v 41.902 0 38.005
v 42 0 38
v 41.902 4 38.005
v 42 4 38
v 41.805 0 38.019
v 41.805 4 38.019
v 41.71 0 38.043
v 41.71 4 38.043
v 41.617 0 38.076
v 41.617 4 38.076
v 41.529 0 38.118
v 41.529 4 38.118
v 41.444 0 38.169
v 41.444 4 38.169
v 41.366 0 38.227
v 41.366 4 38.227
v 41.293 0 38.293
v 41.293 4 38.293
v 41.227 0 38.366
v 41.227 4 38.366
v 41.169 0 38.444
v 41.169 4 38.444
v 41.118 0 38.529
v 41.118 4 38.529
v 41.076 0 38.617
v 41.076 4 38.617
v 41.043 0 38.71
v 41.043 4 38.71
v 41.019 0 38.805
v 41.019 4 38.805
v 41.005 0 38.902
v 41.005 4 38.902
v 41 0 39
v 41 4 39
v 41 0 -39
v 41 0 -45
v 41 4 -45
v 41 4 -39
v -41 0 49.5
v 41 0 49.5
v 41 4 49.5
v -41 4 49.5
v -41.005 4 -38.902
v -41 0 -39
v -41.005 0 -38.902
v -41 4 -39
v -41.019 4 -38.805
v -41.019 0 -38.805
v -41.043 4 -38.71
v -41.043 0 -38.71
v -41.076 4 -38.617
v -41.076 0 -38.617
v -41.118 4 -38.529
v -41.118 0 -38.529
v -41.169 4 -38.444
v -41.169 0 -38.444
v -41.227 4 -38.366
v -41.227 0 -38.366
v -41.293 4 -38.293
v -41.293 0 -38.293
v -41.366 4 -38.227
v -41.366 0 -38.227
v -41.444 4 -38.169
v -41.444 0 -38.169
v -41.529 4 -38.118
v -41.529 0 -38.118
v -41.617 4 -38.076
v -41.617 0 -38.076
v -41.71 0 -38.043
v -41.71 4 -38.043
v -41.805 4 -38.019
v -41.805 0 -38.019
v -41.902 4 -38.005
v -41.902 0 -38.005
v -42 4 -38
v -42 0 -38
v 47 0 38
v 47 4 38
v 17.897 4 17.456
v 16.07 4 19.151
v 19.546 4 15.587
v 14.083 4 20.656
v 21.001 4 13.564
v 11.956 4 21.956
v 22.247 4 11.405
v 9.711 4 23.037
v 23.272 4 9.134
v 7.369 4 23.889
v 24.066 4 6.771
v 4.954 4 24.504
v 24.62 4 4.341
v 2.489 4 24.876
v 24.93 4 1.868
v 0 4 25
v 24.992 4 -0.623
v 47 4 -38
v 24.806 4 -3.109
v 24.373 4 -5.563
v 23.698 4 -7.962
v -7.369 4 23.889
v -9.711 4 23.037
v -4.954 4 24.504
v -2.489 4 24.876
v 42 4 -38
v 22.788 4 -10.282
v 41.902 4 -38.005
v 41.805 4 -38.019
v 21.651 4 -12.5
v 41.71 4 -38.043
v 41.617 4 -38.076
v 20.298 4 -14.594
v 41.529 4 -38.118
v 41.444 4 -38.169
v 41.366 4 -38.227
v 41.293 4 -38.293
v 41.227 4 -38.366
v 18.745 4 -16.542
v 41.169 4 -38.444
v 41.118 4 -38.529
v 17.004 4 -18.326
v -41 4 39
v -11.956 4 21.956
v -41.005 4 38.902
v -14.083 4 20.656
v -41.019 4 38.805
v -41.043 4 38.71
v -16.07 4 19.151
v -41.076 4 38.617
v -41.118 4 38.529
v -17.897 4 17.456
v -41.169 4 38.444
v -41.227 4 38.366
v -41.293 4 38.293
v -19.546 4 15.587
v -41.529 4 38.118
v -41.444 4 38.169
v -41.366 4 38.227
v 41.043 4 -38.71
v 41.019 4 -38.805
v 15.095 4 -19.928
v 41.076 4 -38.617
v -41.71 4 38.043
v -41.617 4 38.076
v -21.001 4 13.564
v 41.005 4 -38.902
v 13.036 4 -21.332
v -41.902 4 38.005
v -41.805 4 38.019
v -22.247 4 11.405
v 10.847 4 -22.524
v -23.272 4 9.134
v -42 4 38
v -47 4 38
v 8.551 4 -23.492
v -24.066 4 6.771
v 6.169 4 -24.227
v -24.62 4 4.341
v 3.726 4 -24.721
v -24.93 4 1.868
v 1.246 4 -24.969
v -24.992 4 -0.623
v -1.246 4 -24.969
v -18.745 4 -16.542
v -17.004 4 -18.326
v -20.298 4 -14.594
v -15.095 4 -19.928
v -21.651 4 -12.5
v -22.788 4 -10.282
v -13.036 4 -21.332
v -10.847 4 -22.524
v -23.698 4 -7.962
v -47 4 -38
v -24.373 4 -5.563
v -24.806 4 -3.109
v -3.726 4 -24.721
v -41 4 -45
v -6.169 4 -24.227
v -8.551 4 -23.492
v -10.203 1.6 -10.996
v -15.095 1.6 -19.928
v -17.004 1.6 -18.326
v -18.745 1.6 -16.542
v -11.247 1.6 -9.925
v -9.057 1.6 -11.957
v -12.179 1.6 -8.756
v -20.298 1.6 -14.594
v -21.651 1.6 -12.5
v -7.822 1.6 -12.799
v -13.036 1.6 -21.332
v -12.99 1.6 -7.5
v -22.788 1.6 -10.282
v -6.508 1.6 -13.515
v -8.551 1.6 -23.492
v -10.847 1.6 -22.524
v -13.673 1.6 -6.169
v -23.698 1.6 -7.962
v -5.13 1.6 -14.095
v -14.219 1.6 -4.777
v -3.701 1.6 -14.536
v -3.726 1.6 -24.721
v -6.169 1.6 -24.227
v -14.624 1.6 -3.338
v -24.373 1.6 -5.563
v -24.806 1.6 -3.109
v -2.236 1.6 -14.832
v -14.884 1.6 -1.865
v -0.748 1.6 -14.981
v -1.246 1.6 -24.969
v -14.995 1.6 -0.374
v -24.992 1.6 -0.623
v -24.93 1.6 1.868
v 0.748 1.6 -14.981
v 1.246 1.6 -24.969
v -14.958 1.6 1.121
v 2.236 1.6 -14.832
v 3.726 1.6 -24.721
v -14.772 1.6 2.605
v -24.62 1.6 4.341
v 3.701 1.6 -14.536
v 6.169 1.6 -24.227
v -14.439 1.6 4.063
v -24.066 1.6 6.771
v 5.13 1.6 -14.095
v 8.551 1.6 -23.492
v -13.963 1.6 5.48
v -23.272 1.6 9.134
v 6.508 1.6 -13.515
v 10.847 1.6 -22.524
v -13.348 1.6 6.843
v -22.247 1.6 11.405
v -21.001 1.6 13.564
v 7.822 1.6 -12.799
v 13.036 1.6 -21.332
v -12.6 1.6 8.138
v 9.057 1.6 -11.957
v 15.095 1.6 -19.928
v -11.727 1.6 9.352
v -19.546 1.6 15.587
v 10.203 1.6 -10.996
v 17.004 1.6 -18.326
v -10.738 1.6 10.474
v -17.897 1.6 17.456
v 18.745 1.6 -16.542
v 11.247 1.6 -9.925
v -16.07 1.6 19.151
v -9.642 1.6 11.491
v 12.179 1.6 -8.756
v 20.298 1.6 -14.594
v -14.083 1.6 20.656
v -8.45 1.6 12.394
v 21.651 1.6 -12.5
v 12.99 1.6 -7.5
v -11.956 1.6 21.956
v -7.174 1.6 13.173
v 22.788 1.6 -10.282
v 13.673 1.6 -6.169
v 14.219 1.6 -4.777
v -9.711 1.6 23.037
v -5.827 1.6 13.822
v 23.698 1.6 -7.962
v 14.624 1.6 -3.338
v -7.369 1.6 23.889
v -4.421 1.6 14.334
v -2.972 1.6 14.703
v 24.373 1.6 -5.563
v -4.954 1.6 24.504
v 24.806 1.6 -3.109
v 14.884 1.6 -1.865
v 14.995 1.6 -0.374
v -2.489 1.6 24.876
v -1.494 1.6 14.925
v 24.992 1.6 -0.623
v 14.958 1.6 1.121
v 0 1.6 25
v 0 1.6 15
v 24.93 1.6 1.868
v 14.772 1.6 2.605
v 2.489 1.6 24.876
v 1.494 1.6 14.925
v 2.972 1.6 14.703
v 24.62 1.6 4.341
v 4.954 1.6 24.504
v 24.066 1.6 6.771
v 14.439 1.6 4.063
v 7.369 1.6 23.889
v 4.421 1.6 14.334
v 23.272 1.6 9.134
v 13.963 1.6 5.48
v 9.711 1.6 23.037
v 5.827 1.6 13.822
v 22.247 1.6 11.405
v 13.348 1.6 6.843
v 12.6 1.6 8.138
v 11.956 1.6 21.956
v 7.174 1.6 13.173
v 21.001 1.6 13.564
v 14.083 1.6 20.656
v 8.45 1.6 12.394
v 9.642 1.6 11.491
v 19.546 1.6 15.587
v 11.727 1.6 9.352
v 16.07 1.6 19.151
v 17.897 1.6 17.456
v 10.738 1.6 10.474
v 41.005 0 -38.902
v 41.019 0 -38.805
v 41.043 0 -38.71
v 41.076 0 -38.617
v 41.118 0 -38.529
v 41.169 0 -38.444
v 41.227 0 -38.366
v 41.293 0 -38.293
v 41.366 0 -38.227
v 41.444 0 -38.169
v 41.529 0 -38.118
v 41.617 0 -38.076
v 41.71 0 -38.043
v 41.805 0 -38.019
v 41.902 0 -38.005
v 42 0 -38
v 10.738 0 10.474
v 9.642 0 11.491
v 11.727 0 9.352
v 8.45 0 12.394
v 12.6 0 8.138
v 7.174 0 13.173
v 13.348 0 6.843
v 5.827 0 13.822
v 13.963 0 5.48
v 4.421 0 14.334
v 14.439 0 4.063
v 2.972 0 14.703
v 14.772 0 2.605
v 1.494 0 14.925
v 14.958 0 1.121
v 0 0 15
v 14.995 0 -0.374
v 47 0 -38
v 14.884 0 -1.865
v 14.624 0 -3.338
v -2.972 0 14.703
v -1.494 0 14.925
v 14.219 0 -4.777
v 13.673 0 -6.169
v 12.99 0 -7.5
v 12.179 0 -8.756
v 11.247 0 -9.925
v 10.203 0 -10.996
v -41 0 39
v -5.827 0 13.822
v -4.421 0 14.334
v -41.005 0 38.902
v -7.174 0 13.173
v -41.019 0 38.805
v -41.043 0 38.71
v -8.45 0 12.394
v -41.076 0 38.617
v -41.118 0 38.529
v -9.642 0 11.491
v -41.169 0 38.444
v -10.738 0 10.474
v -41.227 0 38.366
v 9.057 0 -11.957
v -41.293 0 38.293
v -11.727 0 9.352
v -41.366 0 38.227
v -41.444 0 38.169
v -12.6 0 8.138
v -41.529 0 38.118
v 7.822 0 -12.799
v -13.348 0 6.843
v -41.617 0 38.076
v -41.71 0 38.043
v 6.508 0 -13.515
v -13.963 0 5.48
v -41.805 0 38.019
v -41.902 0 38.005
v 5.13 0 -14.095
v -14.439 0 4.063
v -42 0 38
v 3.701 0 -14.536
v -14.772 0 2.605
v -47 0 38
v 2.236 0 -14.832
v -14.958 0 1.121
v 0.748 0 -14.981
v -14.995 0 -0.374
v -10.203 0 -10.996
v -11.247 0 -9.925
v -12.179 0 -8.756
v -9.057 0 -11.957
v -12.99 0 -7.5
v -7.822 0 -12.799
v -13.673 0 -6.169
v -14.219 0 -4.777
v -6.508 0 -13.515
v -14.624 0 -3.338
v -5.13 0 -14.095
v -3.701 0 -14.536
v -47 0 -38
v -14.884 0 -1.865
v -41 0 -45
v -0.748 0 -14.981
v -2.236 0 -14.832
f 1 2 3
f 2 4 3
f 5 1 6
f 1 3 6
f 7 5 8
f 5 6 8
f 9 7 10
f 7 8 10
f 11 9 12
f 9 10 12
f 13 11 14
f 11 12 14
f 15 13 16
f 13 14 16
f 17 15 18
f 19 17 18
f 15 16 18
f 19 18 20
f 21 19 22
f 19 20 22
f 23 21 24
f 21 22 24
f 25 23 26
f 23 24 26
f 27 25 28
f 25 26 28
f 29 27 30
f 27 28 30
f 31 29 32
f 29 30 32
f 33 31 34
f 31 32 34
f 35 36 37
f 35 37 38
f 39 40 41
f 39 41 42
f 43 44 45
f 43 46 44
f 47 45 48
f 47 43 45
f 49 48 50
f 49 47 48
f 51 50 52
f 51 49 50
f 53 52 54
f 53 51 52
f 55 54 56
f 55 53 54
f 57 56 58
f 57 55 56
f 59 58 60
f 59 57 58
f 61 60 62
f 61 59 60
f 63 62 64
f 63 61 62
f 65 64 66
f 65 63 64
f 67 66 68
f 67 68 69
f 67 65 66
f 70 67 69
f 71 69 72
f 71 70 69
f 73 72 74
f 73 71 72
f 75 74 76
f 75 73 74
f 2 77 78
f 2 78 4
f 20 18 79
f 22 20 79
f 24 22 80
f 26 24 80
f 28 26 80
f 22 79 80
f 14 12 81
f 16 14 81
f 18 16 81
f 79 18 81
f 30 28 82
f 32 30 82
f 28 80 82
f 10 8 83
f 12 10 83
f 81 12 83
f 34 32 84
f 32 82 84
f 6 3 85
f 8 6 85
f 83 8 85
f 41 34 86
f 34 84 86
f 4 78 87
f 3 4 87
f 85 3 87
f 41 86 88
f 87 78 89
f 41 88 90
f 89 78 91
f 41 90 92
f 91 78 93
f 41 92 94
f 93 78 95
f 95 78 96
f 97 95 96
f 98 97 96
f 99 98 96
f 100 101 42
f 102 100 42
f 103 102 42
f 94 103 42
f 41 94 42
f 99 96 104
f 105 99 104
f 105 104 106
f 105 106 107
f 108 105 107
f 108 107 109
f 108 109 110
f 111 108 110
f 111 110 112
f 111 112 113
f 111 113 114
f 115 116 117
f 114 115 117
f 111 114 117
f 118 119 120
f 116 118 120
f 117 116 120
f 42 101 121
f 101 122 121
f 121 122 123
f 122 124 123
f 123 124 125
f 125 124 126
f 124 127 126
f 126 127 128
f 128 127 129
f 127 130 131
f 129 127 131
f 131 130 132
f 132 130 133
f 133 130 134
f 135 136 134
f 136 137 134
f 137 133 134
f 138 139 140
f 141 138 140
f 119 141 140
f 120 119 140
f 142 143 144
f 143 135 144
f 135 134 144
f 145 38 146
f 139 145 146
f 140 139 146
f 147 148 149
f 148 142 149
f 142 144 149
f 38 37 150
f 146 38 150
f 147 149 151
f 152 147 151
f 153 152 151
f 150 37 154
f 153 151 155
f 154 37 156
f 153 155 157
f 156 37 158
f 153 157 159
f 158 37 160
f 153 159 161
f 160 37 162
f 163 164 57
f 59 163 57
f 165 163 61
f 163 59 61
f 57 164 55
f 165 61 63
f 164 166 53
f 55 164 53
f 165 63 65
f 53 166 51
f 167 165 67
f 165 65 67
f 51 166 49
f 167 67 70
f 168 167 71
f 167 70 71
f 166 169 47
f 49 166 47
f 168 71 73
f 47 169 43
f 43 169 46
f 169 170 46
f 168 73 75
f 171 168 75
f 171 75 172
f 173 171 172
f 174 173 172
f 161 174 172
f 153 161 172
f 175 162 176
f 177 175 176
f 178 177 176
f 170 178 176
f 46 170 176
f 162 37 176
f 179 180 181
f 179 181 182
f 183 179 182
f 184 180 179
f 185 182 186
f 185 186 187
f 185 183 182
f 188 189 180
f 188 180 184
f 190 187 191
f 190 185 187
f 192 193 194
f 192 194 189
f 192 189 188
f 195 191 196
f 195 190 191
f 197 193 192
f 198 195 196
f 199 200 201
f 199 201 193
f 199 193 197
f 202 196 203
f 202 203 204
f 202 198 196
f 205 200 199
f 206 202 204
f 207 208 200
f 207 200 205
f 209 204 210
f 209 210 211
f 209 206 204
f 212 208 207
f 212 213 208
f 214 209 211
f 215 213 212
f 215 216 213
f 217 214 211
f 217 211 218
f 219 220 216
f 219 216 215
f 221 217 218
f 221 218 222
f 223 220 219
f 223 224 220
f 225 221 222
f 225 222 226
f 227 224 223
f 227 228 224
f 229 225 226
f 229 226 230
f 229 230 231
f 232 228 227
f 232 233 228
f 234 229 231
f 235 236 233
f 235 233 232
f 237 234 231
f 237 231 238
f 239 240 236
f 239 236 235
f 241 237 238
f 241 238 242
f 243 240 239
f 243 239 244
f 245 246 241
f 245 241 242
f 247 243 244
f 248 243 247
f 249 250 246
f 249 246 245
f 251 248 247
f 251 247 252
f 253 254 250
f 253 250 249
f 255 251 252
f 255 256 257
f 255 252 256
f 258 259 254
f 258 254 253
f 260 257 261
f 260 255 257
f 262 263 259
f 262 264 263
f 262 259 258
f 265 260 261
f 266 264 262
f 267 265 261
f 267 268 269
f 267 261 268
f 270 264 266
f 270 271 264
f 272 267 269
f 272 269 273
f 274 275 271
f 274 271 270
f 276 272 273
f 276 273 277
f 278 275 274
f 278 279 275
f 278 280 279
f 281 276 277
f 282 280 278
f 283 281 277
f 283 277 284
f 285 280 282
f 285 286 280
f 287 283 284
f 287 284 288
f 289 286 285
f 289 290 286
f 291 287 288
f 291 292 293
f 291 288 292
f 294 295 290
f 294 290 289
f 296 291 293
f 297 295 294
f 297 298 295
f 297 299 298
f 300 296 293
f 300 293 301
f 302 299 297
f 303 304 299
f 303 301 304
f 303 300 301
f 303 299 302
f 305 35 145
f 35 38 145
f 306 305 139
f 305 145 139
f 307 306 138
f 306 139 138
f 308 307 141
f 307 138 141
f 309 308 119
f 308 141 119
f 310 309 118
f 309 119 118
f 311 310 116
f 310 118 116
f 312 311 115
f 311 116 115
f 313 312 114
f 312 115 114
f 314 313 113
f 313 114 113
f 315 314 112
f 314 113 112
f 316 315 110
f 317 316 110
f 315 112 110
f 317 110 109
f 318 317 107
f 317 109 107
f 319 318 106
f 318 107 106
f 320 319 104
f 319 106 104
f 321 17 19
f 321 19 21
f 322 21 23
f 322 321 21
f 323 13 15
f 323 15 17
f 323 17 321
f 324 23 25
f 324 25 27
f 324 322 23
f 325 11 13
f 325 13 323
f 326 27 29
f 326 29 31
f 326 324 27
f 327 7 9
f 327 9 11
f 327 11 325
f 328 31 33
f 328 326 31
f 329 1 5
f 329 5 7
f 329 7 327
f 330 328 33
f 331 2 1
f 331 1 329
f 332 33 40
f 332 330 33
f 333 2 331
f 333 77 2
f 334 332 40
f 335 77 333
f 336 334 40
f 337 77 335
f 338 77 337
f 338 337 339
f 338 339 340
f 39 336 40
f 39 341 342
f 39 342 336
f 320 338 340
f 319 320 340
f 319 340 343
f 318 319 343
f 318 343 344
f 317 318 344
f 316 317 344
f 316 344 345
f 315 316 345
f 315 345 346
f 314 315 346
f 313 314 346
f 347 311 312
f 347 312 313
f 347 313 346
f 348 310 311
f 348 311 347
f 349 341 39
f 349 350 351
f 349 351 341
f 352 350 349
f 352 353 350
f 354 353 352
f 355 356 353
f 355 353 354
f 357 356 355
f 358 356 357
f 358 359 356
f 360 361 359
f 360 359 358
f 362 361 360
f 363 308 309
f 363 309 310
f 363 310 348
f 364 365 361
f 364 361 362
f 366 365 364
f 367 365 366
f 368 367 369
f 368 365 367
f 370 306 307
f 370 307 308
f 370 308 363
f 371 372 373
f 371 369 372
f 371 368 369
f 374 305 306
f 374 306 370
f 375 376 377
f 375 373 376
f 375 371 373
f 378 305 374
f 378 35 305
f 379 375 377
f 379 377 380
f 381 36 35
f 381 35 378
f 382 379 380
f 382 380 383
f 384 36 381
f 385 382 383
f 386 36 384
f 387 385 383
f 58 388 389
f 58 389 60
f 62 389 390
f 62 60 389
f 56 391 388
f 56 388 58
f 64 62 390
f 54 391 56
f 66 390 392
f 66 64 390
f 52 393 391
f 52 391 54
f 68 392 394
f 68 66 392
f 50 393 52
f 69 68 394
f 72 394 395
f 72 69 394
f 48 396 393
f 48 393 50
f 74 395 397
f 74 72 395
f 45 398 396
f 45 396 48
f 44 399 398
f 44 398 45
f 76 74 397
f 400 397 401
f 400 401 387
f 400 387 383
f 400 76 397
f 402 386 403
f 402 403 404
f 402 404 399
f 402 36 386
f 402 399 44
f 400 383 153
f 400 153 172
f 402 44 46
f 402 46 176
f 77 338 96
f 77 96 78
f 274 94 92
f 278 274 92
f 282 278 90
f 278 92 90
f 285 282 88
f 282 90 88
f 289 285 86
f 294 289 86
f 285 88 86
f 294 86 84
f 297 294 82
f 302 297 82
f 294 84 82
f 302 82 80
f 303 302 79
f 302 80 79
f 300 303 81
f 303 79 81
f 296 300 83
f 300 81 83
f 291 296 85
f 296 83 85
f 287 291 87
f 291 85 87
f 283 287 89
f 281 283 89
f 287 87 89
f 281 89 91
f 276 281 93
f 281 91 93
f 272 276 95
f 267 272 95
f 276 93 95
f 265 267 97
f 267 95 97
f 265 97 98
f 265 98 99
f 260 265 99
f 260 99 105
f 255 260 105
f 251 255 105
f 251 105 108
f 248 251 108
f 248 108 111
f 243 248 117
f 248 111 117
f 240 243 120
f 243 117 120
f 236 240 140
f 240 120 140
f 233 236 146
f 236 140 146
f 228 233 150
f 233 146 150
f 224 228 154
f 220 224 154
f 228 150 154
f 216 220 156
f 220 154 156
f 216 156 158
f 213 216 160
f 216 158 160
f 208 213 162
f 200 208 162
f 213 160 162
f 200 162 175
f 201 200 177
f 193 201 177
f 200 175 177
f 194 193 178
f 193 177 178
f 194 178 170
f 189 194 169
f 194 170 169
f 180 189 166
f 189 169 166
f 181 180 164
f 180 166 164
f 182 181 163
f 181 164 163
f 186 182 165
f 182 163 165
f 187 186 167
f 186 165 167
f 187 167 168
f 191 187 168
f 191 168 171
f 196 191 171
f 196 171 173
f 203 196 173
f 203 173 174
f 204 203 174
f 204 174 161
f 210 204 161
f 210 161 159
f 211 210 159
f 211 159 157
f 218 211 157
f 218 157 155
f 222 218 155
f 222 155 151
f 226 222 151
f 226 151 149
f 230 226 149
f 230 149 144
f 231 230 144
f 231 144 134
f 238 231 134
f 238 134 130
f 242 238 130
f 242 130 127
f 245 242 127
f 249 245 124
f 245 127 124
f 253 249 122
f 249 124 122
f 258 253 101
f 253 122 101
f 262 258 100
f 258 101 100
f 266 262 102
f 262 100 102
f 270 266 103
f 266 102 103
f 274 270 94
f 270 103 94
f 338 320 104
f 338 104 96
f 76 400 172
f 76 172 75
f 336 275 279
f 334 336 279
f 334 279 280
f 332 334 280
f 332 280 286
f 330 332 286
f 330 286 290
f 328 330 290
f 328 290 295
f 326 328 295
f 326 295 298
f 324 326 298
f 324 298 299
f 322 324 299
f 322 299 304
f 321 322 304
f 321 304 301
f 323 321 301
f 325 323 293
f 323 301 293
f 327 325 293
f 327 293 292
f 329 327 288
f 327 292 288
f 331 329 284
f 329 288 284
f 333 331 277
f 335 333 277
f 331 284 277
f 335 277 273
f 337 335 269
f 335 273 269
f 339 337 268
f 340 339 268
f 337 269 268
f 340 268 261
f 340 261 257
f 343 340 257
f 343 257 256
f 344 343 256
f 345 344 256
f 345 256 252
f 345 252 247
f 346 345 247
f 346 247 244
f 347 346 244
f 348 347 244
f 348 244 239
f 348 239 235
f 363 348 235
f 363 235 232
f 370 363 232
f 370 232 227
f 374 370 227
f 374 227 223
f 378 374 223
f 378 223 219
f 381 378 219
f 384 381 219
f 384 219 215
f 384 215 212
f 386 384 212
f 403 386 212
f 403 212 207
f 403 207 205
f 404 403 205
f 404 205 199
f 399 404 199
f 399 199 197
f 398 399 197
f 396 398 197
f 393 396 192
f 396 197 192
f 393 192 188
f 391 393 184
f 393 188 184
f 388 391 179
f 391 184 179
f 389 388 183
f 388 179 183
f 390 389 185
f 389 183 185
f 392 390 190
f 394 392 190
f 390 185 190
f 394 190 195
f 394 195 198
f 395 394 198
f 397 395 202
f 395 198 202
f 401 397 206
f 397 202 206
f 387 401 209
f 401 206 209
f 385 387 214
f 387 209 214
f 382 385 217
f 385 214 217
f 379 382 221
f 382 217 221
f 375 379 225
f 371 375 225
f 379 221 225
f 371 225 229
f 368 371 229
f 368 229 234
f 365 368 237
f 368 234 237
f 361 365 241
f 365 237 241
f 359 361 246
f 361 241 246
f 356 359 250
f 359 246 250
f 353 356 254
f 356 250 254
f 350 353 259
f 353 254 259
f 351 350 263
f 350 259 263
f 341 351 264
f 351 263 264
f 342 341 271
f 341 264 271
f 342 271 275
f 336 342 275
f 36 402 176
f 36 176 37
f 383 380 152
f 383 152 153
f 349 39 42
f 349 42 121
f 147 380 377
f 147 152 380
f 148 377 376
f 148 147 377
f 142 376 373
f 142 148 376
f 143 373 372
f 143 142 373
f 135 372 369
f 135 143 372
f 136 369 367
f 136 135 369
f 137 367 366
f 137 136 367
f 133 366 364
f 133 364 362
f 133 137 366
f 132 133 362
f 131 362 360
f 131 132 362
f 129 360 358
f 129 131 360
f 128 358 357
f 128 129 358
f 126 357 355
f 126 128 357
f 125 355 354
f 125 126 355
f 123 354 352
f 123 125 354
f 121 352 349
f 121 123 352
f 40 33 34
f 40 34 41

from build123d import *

# Parameters (mm, degrees)
BOSS_EXTRUDE1_DEPTH = 4
CUT_EXTRUDE1_REACH  = 70.376
SKETCH2_R           = 15
FILLET1_R           = 1
SKETCH4_R           = 25
SKETCH4_R_2         = 15
CUT_EXTRUDE2_DEPTH  = 2.4


with BuildPart() as part:
    # Sketch1 → Boss-Extrude1 (new body)
    with BuildSketch(Plane(origin=(0, 0, 0), x_dir=(1, 0, 0), z_dir=(0, 1, 0))):
        Polygon((-41, 38), (-41, 45), (41, 45), (41, 38), (47, 38), (47, -38), (41, -38), (41, -49.5), (-41, -49.5), (-41, -38), (-47, -38), (-47, 38), align=None)
    extrude(amount=BOSS_EXTRUDE1_DEPTH)

    # Sketch2 → Cut-Extrude1 (cut, up to next)
    with BuildSketch(Plane(origin=(0, 4, 0), x_dir=(1, 0, 0), z_dir=(0, 1, 0)), mode=Mode.PRIVATE) as cut_extrude1_sk1:
        with Locations(Location((0, 0, 0), (0, 0, 270))):
            Circle(SKETCH2_R)
    cut_extrude1_tool1 = extrude(cut_extrude1_sk1.sketch, amount=-CUT_EXTRUDE1_REACH, mode=Mode.PRIVATE) & part.part
    add(cut_extrude1_tool1.solids().sort_by_distance((0, 4, 0))[0], mode=Mode.SUBTRACT)

    # Fillet1
    fillet1_edges = [part.edges().sort_by_distance(p)[0] for p in [
        (41, 2, 38),
        (-41, 2, 38),
        (-41, 2, -38),
        (41, 2, -38),
    ]]
    fillet(fillet1_edges, radius=FILLET1_R)

    # Sketch4 → Cut-Extrude2 (cut)
    with BuildSketch(Plane(origin=(0, 4, 0), x_dir=(1, 0, 0), z_dir=(0, 1, 0))):
        with Locations(Location((0, 0, 0), (0, 0, 270))):
            Circle(SKETCH4_R)
        with Locations(Location((0, 0, 0), (0, 0, 270))):
            Circle(SKETCH4_R_2, mode=Mode.SUBTRACT)
    extrude(amount=-CUT_EXTRUDE2_DEPTH, mode=Mode.SUBTRACT)


solid = part.part
